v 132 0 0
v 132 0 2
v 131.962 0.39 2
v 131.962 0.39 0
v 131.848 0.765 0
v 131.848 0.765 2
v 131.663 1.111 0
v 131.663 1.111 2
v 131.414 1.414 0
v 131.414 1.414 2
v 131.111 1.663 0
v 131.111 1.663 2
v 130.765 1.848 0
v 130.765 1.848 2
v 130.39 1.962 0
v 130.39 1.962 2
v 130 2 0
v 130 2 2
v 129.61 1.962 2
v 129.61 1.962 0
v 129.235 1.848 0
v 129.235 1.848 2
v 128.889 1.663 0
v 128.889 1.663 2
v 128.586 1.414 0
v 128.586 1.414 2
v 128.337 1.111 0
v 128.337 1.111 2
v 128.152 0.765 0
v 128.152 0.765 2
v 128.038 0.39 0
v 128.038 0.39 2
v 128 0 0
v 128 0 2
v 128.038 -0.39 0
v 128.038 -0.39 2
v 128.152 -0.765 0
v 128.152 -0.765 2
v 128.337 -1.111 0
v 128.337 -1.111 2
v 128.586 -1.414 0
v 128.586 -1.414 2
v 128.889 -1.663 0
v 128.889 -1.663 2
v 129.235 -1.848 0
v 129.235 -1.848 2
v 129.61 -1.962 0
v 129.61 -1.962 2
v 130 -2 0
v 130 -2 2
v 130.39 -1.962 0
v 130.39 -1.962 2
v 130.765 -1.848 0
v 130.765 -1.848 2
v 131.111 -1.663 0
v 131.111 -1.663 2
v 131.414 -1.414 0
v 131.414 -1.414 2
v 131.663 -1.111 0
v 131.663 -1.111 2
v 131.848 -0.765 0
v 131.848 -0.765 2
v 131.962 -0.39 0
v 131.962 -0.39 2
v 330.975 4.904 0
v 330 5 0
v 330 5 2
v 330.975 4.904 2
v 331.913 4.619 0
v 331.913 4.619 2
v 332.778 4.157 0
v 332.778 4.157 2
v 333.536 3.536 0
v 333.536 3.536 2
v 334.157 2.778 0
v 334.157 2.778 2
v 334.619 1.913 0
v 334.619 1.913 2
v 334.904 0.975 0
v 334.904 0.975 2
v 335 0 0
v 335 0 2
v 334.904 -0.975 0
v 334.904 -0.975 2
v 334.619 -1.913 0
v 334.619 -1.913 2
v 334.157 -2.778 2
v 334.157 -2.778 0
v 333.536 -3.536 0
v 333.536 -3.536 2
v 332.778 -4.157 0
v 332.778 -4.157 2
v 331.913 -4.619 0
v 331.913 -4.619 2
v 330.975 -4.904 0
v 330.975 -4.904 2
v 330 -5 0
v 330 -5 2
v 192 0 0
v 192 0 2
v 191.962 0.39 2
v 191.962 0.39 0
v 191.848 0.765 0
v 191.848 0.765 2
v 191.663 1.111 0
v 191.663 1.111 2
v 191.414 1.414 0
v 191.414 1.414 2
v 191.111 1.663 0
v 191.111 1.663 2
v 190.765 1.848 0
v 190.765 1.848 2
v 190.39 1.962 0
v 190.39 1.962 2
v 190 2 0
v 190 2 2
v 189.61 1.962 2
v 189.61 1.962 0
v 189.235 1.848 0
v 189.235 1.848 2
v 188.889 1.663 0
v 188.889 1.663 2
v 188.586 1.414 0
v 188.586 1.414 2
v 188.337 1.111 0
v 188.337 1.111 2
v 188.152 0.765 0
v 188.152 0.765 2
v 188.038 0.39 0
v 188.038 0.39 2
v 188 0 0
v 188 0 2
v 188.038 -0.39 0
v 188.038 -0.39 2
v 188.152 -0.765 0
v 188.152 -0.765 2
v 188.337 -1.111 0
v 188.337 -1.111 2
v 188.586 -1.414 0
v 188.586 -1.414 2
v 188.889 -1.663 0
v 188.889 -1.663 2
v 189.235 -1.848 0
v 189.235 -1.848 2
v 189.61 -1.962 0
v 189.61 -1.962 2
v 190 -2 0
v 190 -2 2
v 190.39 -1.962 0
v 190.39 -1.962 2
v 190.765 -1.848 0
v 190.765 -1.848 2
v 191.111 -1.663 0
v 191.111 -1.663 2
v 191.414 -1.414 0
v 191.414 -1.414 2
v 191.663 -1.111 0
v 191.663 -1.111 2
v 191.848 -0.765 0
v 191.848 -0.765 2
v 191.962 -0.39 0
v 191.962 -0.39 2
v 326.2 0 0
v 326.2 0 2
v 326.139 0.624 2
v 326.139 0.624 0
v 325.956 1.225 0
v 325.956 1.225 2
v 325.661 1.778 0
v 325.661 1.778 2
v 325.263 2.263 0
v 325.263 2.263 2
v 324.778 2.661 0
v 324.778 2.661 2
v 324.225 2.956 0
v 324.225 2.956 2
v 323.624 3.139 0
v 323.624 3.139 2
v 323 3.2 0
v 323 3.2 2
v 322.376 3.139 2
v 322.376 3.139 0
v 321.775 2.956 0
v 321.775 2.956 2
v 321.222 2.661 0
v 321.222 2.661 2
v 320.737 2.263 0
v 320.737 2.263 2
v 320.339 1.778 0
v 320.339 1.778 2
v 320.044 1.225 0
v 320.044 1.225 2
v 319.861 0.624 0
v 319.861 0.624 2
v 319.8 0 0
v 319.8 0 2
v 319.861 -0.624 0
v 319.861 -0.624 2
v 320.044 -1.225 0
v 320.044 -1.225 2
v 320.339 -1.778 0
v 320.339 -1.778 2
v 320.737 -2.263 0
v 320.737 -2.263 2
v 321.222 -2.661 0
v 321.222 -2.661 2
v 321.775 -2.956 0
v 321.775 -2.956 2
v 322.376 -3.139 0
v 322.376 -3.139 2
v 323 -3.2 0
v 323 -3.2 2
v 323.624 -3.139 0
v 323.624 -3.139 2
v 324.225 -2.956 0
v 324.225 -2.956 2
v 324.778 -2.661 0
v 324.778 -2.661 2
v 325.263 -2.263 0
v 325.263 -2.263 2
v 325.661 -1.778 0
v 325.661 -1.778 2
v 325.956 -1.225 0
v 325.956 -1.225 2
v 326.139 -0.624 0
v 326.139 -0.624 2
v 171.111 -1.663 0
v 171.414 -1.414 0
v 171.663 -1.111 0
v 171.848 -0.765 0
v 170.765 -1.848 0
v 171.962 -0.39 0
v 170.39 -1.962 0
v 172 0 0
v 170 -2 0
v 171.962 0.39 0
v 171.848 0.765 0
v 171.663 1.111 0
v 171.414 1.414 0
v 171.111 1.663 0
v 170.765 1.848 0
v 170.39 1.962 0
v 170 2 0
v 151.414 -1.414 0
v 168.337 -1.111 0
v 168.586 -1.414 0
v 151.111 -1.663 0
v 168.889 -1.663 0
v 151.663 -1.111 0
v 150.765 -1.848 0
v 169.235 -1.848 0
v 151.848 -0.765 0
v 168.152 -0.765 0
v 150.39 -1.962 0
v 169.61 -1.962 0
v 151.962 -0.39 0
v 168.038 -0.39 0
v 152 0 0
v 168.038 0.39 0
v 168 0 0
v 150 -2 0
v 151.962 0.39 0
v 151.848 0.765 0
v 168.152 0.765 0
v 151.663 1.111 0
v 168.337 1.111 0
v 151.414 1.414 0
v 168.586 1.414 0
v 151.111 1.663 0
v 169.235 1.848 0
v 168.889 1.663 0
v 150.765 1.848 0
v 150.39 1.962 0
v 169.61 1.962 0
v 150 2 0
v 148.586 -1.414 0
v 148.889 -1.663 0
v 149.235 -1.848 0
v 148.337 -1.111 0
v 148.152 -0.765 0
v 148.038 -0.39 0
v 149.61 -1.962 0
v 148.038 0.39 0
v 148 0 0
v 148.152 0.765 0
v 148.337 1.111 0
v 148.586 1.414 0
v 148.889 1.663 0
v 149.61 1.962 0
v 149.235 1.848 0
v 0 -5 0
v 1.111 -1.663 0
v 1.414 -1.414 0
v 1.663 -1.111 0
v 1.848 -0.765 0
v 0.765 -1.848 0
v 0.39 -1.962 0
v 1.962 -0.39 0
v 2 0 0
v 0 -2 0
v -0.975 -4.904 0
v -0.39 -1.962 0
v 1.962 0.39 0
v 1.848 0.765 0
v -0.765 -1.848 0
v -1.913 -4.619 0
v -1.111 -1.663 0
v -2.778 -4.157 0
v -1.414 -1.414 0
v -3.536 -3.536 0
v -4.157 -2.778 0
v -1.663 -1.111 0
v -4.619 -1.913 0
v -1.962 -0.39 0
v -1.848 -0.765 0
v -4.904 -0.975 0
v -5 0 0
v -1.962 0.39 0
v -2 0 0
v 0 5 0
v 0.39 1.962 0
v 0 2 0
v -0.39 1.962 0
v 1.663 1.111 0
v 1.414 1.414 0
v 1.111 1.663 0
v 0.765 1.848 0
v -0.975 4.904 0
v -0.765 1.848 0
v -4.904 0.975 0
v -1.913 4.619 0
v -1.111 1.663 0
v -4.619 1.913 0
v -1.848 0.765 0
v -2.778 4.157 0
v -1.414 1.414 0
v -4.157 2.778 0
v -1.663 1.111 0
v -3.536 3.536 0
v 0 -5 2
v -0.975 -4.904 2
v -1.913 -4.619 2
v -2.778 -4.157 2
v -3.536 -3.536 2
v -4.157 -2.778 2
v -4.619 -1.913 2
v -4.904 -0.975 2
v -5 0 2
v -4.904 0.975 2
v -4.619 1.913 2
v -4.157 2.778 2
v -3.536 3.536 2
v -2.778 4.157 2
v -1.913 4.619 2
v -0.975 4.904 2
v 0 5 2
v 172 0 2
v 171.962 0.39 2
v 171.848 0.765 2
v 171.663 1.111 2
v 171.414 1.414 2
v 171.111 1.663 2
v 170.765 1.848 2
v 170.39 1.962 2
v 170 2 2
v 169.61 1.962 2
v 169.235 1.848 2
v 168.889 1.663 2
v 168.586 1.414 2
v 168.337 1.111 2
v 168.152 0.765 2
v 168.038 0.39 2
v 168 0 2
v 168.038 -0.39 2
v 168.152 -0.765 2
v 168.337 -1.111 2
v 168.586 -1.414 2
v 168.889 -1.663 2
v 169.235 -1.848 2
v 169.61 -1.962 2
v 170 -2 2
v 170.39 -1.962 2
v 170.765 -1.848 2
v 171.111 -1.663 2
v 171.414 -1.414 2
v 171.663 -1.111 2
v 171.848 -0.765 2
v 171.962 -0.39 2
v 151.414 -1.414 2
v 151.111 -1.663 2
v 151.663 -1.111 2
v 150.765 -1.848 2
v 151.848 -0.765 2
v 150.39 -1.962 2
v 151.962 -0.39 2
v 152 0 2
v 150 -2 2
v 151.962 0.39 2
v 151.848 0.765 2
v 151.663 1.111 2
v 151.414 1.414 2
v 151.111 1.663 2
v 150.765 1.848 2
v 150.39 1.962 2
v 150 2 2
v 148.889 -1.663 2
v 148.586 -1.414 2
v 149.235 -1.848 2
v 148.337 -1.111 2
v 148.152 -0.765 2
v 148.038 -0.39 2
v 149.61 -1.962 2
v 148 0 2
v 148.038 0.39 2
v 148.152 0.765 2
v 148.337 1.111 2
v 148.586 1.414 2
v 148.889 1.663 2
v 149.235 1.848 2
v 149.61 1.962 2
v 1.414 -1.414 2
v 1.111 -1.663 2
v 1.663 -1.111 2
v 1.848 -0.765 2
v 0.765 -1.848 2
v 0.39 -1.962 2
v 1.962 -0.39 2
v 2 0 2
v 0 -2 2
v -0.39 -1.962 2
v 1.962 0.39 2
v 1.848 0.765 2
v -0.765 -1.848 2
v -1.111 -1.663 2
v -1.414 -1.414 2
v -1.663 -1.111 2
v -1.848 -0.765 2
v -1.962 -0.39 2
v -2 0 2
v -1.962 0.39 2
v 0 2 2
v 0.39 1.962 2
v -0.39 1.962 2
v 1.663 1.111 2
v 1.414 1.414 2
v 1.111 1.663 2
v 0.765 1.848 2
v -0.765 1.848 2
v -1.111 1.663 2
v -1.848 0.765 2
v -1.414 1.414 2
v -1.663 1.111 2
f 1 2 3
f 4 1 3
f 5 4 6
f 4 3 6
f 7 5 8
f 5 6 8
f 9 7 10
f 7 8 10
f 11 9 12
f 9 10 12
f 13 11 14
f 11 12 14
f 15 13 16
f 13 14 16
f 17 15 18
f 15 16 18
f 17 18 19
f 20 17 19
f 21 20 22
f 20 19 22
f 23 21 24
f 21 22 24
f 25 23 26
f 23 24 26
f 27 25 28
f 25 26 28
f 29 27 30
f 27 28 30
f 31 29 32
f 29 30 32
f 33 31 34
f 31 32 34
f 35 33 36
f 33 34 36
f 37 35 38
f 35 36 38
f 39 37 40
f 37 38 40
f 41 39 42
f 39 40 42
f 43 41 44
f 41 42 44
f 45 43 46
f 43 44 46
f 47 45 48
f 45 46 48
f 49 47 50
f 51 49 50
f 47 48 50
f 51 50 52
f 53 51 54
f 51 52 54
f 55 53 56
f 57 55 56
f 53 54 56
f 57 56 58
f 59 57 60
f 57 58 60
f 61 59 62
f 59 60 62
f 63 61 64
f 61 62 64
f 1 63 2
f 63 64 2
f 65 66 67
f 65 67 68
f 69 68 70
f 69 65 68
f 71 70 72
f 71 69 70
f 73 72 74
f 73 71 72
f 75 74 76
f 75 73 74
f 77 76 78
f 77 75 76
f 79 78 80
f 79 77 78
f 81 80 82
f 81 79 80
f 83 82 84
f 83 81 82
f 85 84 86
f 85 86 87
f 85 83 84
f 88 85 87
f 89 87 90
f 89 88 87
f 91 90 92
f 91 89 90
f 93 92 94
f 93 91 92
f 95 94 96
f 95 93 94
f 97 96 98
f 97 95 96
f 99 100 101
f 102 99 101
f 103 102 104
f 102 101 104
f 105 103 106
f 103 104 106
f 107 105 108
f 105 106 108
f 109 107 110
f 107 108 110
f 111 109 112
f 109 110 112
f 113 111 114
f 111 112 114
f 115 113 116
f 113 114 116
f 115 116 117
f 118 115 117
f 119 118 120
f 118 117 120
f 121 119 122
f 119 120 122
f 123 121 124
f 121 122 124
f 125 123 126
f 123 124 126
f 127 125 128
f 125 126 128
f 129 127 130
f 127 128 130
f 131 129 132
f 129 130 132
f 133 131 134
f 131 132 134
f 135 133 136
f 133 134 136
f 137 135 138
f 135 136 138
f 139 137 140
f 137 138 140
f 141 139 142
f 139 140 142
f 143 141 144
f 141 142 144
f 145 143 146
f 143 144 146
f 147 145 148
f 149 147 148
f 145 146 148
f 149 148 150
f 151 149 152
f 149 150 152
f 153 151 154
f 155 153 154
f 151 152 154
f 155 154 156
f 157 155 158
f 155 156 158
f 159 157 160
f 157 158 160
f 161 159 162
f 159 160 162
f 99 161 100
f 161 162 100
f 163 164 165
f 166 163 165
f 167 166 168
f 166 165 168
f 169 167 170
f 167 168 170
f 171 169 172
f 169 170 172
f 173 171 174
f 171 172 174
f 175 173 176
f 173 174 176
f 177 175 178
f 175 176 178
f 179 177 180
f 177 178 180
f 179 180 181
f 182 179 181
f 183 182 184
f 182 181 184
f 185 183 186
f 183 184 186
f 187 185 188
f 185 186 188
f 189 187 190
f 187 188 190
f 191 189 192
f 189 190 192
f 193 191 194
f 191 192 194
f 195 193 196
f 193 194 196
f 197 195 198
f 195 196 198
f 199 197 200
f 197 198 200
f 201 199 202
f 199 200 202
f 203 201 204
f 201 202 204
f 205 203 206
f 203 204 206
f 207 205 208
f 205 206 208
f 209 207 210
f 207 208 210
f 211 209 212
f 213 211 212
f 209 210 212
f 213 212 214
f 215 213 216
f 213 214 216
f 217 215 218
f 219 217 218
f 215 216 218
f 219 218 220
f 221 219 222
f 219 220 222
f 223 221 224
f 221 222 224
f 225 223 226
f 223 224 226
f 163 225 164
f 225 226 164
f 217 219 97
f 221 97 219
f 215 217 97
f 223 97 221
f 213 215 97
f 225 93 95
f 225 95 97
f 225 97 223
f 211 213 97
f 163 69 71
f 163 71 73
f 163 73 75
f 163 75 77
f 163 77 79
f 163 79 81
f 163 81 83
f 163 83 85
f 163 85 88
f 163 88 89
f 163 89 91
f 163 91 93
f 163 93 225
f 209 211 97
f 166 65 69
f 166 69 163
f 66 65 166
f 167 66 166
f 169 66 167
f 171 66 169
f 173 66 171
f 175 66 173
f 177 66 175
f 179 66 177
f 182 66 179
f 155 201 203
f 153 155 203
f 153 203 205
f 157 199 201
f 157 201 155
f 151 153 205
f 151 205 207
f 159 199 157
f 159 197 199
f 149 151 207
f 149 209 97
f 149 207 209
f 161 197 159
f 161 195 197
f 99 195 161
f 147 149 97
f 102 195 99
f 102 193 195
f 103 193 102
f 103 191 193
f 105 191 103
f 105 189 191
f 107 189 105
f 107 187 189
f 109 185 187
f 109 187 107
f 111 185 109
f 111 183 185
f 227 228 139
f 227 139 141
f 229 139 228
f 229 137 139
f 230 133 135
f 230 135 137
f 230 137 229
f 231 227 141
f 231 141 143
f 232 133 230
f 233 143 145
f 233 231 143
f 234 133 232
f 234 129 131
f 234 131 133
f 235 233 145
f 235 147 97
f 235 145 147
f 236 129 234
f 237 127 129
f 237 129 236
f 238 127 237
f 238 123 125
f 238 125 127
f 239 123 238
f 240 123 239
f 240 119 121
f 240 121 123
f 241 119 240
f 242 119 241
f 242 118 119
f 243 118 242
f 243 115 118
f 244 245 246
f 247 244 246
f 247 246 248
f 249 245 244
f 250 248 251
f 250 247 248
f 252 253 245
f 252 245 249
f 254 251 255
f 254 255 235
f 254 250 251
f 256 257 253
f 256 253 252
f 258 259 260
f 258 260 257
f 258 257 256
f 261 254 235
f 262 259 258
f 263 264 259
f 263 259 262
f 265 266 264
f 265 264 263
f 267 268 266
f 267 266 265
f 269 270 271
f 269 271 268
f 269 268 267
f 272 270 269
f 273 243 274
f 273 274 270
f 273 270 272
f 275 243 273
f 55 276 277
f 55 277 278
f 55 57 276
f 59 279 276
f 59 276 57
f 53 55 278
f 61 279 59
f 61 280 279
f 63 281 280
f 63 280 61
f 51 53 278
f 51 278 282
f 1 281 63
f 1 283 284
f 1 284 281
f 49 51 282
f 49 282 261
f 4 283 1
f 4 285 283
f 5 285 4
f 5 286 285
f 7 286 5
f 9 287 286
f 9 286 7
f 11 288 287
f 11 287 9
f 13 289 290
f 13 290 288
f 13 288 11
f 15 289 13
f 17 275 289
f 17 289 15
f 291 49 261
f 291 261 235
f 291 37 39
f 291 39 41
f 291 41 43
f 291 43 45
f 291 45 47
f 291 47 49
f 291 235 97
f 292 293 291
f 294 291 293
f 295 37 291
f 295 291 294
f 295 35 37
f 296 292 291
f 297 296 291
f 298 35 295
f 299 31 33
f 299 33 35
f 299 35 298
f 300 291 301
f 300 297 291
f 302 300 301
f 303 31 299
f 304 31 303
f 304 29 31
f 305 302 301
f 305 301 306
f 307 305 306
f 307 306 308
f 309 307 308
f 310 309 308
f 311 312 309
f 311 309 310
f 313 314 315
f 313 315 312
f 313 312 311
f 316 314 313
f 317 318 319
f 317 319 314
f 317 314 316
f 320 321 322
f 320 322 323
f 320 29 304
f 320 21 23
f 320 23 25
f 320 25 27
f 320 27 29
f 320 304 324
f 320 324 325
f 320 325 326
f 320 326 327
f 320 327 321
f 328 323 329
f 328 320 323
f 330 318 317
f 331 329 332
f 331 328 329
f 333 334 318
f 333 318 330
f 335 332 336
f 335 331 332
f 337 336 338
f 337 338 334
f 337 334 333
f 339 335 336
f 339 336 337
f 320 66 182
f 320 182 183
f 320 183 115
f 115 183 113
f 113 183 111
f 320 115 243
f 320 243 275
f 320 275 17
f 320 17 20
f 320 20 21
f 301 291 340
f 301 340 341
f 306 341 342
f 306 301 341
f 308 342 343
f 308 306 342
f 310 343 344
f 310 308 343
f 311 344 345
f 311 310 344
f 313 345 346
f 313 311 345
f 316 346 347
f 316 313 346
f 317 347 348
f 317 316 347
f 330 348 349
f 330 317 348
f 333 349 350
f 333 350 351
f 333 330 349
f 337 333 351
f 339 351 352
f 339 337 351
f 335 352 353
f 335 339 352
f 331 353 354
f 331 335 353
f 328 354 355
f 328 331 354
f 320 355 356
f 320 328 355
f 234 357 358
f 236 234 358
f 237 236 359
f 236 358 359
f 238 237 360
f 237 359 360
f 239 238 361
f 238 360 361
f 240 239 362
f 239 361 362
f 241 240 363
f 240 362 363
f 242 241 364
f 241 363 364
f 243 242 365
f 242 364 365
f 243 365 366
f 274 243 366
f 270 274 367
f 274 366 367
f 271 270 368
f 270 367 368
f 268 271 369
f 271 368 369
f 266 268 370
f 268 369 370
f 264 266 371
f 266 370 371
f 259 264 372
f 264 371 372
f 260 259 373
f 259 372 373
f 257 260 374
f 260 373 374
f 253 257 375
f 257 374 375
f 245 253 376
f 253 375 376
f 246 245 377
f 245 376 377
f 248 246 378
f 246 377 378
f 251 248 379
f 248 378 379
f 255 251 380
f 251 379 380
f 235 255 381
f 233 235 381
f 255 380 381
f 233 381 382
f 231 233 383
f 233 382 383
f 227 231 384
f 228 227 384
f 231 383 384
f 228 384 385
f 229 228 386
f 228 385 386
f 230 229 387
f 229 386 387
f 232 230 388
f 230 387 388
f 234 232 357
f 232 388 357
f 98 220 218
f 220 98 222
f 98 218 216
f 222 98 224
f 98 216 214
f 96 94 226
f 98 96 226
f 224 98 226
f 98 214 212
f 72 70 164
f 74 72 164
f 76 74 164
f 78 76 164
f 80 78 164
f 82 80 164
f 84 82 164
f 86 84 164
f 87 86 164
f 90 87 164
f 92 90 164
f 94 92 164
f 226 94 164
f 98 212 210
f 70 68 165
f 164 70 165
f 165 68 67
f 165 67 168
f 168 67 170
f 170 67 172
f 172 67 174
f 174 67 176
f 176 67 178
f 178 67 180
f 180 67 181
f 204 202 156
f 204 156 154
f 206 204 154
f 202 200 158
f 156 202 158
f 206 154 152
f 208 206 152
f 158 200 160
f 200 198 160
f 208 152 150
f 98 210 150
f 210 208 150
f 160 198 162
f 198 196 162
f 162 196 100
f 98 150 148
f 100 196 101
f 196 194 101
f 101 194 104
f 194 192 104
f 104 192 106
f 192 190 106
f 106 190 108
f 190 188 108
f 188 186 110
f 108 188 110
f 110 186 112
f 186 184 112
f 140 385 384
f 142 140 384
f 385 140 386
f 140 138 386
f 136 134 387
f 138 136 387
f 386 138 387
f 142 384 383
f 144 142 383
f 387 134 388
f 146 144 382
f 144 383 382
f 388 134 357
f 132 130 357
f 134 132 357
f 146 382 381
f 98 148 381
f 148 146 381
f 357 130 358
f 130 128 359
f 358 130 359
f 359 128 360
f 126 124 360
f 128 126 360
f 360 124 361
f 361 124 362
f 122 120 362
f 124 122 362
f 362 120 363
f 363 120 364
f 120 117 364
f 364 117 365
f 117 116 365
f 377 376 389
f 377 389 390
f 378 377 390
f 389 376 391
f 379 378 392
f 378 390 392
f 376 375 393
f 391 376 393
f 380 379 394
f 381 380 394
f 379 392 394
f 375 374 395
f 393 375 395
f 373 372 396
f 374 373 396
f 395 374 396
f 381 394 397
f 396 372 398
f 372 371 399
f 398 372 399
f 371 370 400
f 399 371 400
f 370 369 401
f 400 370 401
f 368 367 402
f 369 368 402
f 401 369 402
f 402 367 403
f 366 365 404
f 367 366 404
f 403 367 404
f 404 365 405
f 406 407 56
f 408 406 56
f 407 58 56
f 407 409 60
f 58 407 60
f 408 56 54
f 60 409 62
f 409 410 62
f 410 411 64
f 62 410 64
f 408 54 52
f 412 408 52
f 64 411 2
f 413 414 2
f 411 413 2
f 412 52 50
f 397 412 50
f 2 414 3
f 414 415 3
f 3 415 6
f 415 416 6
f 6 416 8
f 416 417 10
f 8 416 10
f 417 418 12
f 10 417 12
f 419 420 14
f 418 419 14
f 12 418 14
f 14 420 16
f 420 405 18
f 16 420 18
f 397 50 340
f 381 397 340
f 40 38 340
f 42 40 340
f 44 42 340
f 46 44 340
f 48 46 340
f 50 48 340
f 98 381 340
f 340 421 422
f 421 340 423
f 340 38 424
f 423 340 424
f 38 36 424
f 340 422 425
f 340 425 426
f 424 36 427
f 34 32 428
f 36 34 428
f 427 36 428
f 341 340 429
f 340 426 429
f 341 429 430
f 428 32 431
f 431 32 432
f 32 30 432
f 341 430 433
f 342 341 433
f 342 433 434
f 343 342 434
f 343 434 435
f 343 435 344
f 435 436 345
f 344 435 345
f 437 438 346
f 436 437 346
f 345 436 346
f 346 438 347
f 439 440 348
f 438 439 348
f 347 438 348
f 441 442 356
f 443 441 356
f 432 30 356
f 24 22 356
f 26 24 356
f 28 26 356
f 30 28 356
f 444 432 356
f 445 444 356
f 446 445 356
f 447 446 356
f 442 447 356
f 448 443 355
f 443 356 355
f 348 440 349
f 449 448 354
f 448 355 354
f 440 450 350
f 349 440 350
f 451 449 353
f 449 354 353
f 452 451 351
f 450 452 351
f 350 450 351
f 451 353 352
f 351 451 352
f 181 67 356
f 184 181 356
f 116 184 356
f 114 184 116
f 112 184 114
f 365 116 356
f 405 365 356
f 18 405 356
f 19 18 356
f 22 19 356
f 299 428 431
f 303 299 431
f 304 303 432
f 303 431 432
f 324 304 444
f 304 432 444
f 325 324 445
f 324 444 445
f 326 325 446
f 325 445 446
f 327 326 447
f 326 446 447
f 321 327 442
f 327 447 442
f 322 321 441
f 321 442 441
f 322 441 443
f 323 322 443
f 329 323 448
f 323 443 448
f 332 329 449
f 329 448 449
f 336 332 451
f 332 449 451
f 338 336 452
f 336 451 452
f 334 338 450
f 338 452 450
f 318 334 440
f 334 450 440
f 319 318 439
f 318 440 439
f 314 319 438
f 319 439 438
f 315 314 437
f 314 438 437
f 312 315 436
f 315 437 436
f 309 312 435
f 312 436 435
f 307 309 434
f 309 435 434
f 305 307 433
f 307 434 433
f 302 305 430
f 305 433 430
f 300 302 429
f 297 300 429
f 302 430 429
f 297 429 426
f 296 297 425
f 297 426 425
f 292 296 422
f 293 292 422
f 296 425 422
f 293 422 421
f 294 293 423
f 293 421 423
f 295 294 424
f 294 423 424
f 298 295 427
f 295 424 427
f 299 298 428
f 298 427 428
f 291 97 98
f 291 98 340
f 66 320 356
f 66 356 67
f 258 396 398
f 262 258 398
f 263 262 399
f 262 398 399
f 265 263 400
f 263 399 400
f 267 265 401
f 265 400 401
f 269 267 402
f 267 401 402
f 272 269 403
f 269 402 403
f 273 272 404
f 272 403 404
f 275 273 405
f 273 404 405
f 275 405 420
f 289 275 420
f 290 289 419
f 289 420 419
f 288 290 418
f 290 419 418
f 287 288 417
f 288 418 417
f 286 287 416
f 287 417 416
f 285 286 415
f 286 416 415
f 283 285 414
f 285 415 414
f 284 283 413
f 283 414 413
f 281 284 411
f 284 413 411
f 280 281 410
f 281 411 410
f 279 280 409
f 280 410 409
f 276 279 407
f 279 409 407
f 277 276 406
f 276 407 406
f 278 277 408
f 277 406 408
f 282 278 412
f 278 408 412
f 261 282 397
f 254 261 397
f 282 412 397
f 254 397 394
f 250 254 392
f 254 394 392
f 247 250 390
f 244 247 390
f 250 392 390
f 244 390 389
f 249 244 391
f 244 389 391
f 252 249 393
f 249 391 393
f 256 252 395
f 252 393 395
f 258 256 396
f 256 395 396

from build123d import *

# Parameters (mm, degrees)
BOSS_EXTRUDE1_DEPTH = 2
SKETCH2_R           = 3.2
CUT_EXTRUDE1_DEPTH  = 2
SKETCH5_R           = 2
CUT_EXTRUDE2_DEPTH  = 2
SKETCH10_R          = 2
CUT_EXTRUDE4_DEPTH  = 2


with BuildPart() as part:
    # Sketch1 → Boss-Extrude1 (new body)
    with BuildSketch(Plane.XY):
        with BuildLine():
            Line((0, 5), (330, 5))
            ThreePointArc((330, 5), (335, 0), (330, -5))
            Line((330, -5), (0, -5))
            ThreePointArc((0, -5), (-5, 0), (0, 5))
        make_face()
    extrude(amount=BOSS_EXTRUDE1_DEPTH)

    # Sketch2 → Cut-Extrude1 (cut)
    with BuildSketch(Plane.XY.offset(2)):
        with Locations((323, 0)):
            Circle(SKETCH2_R)
    extrude(amount=-CUT_EXTRUDE1_DEPTH, mode=Mode.SUBTRACT)

    # Sketch5 → Cut-Extrude2 (cut)
    with BuildSketch(Plane.XY.offset(2)):
        with Locations((190, 0)):
            Circle(SKETCH5_R)
        with Locations((170, 0)):
            Circle(SKETCH5_R)
        with Locations((150, 0)):
            Circle(SKETCH5_R)
        with Locations((130, 0)):
            Circle(SKETCH5_R)
    extrude(amount=-CUT_EXTRUDE2_DEPTH, mode=Mode.SUBTRACT)

    # Sketch10 → Cut-Extrude4 (cut)
    with BuildSketch(Plane.XY.offset(2)):
        Circle(SKETCH10_R)
    extrude(amount=-CUT_EXTRUDE4_DEPTH, mode=Mode.SUBTRACT)


solid = part.part
